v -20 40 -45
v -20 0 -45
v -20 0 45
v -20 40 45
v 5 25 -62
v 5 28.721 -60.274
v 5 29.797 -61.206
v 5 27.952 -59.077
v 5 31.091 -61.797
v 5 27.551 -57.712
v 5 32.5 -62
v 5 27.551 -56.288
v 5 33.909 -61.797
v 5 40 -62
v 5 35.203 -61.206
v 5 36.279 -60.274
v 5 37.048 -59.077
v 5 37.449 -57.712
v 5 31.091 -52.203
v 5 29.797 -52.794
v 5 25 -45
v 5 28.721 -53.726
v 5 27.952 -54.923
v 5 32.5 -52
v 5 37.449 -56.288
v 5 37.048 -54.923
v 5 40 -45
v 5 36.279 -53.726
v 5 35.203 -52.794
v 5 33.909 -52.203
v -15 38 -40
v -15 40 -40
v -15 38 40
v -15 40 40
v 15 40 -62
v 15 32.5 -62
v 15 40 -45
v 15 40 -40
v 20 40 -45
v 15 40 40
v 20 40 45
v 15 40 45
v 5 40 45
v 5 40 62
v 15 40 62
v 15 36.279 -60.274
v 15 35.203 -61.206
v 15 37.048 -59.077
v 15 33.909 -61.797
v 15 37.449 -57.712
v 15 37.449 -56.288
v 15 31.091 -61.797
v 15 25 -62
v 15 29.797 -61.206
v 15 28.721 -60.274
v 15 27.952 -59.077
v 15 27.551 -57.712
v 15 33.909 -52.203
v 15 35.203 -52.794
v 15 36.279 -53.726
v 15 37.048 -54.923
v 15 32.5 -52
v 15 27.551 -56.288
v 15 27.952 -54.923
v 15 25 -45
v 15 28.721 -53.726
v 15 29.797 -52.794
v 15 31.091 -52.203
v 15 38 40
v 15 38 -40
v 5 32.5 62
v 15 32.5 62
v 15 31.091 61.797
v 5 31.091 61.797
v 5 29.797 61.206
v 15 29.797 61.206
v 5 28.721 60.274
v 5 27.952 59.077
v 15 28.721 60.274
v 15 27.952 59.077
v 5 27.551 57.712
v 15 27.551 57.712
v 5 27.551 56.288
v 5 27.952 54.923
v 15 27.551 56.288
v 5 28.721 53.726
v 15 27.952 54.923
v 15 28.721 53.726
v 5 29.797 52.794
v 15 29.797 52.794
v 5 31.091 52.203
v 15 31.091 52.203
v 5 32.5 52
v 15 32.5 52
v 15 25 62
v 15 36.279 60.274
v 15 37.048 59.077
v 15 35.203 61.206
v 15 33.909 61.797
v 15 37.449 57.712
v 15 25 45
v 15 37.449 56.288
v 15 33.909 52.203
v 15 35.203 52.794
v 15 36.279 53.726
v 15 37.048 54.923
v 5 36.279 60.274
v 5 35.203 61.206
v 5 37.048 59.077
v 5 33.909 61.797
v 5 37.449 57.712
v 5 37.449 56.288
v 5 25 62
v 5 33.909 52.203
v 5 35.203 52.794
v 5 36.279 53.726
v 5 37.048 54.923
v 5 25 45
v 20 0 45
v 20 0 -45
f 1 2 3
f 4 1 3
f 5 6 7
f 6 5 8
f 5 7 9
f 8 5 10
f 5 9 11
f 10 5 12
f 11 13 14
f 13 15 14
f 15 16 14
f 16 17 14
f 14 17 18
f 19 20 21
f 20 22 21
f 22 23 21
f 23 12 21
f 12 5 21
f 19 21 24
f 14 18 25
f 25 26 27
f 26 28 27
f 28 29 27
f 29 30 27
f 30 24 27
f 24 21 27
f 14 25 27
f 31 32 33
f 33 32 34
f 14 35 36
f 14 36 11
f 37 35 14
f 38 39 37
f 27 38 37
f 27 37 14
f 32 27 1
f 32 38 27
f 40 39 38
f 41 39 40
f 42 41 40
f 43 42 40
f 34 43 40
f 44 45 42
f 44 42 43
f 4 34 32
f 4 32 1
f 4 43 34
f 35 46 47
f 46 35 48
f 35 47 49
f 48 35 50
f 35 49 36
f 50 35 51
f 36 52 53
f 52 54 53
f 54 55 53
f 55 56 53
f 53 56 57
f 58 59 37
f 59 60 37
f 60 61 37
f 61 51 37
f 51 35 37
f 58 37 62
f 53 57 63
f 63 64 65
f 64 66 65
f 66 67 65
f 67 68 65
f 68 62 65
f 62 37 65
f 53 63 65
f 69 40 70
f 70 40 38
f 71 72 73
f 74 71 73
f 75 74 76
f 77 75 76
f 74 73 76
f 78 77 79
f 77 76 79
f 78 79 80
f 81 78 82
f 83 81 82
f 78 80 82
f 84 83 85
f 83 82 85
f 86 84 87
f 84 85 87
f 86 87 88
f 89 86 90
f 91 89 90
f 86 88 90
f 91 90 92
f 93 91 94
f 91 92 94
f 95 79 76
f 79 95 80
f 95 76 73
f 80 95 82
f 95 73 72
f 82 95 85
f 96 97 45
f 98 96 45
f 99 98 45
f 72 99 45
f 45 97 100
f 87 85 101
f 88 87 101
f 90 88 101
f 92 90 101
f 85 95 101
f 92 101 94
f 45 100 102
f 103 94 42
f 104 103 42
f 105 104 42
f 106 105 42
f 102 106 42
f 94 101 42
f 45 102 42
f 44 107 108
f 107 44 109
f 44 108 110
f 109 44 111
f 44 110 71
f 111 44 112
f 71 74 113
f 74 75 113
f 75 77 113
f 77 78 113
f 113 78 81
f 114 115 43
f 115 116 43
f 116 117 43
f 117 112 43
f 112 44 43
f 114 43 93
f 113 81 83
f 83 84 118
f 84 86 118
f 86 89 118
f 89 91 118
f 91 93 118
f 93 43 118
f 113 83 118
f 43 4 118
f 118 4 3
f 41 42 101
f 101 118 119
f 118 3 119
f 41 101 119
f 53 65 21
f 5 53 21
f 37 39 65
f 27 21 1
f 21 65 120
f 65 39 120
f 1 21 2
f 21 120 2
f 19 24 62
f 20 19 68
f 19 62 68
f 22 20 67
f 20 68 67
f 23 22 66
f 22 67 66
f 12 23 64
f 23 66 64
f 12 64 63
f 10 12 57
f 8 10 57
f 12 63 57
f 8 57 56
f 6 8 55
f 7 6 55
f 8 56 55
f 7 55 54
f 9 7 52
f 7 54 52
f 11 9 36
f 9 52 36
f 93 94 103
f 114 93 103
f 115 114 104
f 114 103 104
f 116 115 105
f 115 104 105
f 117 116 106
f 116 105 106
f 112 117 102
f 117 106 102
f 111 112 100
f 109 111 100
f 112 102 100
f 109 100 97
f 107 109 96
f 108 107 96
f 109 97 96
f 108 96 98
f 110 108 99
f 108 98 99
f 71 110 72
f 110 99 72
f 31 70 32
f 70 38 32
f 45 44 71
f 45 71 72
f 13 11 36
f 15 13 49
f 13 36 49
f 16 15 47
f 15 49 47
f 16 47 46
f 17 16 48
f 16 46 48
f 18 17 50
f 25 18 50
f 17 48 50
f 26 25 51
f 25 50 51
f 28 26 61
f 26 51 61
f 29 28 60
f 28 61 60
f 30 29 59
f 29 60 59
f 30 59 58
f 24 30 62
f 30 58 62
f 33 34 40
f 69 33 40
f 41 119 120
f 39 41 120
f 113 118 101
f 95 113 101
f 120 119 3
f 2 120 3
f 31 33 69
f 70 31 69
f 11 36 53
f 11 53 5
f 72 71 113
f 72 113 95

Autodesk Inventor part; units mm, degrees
ref_plane "YZ Plane" through (0, 0, 0) normal (1, 0, 0) x (0, 1, 0)
ref_plane "XZ Plane" through (0, 0, 0) normal (0, 1, 0) x (-1, 0, 0)
ref_plane "XY Plane" through (0, 0, 0) normal (0, 0, 1) x (1, 0, 0)
sketch "Sketch1" plane through (0, 0, 0) normal (0, 1, 0) x (-1, 0, 0)
  line L0 (20, 45) -> (-20, 45)
  line L1 (-20, 45) -> (-20, -45)
  line L2 (-20, -45) -> (20, -45)
  line L3 (20, -45) -> (20, 45)
  point P0 (0, 0)
  point P1 (20, 0)
  point P2 (0, -45)
  dimension "d0" = 40
  dimension "d1" = 90
extrude "Extrusion1" add sketch "Sketch1" along normal blind 40
sketch "Sketch2" plane through (-20, 0, 45) normal (0, 0, 1) x (1, 0, 0)
  line L0 (0, 40) -> (40, 40) projected
  line L1 (35, 40) -> (25, 40)
  line L2 (25, 40) -> (25, 25)
  line L3 (25, 25) -> (35, 25)
  line L4 (35, 25) -> (35, 40)
  line L5 (40, 0) -> (40, 40) projected
  point P0 (20, 0)
  dimension "d4" = 5
  dimension "d5" = 10
  dimension "d6" = 15
extrude "Extrusion2" add sketch "Sketch2" along normal blind 17
sketch "Sketch3" plane through (15, 25, 45) normal (1, 0, 0) x (0, 0, -1)
  circle A0 centre (-12, 7.5) radius 5
  line L0 (-17, 0) -> (-17, 15) projected
  line L1 (0, 15) -> (-17, 15) projected
  point P0 (45, -25)
  dimension "d9" = 10
  dimension "d10" = 5
  dimension "d11" = 7.5
extrude "Extrusion3" cut sketch "Sketch3" against normal blind 17
mirror "Mirror3" about plane through (0, 0, 0) normal (0, 0, 1) of "Extrusion2", "Extrusion3"
sketch "Sketch4" plane through (0, 40, 0) normal (0, 1, 0) x (1, 0, 0)
  line L0 (-15, -40) -> (15, -40)
  line L1 (15, -40) -> (15, 40)
  line L2 (15, 40) -> (-15, 40)
  line L3 (-15, 40) -> (-15, -40)
  point P0 (0, 0)
  point P1 (-15, 0)
  point P2 (0, -40)
  dimension "d14" = 80
  dimension "d15" = 30
extrude "Extrusion4" cut sketch "Sketch4" against normal blind 2
properties part number "speaker"
